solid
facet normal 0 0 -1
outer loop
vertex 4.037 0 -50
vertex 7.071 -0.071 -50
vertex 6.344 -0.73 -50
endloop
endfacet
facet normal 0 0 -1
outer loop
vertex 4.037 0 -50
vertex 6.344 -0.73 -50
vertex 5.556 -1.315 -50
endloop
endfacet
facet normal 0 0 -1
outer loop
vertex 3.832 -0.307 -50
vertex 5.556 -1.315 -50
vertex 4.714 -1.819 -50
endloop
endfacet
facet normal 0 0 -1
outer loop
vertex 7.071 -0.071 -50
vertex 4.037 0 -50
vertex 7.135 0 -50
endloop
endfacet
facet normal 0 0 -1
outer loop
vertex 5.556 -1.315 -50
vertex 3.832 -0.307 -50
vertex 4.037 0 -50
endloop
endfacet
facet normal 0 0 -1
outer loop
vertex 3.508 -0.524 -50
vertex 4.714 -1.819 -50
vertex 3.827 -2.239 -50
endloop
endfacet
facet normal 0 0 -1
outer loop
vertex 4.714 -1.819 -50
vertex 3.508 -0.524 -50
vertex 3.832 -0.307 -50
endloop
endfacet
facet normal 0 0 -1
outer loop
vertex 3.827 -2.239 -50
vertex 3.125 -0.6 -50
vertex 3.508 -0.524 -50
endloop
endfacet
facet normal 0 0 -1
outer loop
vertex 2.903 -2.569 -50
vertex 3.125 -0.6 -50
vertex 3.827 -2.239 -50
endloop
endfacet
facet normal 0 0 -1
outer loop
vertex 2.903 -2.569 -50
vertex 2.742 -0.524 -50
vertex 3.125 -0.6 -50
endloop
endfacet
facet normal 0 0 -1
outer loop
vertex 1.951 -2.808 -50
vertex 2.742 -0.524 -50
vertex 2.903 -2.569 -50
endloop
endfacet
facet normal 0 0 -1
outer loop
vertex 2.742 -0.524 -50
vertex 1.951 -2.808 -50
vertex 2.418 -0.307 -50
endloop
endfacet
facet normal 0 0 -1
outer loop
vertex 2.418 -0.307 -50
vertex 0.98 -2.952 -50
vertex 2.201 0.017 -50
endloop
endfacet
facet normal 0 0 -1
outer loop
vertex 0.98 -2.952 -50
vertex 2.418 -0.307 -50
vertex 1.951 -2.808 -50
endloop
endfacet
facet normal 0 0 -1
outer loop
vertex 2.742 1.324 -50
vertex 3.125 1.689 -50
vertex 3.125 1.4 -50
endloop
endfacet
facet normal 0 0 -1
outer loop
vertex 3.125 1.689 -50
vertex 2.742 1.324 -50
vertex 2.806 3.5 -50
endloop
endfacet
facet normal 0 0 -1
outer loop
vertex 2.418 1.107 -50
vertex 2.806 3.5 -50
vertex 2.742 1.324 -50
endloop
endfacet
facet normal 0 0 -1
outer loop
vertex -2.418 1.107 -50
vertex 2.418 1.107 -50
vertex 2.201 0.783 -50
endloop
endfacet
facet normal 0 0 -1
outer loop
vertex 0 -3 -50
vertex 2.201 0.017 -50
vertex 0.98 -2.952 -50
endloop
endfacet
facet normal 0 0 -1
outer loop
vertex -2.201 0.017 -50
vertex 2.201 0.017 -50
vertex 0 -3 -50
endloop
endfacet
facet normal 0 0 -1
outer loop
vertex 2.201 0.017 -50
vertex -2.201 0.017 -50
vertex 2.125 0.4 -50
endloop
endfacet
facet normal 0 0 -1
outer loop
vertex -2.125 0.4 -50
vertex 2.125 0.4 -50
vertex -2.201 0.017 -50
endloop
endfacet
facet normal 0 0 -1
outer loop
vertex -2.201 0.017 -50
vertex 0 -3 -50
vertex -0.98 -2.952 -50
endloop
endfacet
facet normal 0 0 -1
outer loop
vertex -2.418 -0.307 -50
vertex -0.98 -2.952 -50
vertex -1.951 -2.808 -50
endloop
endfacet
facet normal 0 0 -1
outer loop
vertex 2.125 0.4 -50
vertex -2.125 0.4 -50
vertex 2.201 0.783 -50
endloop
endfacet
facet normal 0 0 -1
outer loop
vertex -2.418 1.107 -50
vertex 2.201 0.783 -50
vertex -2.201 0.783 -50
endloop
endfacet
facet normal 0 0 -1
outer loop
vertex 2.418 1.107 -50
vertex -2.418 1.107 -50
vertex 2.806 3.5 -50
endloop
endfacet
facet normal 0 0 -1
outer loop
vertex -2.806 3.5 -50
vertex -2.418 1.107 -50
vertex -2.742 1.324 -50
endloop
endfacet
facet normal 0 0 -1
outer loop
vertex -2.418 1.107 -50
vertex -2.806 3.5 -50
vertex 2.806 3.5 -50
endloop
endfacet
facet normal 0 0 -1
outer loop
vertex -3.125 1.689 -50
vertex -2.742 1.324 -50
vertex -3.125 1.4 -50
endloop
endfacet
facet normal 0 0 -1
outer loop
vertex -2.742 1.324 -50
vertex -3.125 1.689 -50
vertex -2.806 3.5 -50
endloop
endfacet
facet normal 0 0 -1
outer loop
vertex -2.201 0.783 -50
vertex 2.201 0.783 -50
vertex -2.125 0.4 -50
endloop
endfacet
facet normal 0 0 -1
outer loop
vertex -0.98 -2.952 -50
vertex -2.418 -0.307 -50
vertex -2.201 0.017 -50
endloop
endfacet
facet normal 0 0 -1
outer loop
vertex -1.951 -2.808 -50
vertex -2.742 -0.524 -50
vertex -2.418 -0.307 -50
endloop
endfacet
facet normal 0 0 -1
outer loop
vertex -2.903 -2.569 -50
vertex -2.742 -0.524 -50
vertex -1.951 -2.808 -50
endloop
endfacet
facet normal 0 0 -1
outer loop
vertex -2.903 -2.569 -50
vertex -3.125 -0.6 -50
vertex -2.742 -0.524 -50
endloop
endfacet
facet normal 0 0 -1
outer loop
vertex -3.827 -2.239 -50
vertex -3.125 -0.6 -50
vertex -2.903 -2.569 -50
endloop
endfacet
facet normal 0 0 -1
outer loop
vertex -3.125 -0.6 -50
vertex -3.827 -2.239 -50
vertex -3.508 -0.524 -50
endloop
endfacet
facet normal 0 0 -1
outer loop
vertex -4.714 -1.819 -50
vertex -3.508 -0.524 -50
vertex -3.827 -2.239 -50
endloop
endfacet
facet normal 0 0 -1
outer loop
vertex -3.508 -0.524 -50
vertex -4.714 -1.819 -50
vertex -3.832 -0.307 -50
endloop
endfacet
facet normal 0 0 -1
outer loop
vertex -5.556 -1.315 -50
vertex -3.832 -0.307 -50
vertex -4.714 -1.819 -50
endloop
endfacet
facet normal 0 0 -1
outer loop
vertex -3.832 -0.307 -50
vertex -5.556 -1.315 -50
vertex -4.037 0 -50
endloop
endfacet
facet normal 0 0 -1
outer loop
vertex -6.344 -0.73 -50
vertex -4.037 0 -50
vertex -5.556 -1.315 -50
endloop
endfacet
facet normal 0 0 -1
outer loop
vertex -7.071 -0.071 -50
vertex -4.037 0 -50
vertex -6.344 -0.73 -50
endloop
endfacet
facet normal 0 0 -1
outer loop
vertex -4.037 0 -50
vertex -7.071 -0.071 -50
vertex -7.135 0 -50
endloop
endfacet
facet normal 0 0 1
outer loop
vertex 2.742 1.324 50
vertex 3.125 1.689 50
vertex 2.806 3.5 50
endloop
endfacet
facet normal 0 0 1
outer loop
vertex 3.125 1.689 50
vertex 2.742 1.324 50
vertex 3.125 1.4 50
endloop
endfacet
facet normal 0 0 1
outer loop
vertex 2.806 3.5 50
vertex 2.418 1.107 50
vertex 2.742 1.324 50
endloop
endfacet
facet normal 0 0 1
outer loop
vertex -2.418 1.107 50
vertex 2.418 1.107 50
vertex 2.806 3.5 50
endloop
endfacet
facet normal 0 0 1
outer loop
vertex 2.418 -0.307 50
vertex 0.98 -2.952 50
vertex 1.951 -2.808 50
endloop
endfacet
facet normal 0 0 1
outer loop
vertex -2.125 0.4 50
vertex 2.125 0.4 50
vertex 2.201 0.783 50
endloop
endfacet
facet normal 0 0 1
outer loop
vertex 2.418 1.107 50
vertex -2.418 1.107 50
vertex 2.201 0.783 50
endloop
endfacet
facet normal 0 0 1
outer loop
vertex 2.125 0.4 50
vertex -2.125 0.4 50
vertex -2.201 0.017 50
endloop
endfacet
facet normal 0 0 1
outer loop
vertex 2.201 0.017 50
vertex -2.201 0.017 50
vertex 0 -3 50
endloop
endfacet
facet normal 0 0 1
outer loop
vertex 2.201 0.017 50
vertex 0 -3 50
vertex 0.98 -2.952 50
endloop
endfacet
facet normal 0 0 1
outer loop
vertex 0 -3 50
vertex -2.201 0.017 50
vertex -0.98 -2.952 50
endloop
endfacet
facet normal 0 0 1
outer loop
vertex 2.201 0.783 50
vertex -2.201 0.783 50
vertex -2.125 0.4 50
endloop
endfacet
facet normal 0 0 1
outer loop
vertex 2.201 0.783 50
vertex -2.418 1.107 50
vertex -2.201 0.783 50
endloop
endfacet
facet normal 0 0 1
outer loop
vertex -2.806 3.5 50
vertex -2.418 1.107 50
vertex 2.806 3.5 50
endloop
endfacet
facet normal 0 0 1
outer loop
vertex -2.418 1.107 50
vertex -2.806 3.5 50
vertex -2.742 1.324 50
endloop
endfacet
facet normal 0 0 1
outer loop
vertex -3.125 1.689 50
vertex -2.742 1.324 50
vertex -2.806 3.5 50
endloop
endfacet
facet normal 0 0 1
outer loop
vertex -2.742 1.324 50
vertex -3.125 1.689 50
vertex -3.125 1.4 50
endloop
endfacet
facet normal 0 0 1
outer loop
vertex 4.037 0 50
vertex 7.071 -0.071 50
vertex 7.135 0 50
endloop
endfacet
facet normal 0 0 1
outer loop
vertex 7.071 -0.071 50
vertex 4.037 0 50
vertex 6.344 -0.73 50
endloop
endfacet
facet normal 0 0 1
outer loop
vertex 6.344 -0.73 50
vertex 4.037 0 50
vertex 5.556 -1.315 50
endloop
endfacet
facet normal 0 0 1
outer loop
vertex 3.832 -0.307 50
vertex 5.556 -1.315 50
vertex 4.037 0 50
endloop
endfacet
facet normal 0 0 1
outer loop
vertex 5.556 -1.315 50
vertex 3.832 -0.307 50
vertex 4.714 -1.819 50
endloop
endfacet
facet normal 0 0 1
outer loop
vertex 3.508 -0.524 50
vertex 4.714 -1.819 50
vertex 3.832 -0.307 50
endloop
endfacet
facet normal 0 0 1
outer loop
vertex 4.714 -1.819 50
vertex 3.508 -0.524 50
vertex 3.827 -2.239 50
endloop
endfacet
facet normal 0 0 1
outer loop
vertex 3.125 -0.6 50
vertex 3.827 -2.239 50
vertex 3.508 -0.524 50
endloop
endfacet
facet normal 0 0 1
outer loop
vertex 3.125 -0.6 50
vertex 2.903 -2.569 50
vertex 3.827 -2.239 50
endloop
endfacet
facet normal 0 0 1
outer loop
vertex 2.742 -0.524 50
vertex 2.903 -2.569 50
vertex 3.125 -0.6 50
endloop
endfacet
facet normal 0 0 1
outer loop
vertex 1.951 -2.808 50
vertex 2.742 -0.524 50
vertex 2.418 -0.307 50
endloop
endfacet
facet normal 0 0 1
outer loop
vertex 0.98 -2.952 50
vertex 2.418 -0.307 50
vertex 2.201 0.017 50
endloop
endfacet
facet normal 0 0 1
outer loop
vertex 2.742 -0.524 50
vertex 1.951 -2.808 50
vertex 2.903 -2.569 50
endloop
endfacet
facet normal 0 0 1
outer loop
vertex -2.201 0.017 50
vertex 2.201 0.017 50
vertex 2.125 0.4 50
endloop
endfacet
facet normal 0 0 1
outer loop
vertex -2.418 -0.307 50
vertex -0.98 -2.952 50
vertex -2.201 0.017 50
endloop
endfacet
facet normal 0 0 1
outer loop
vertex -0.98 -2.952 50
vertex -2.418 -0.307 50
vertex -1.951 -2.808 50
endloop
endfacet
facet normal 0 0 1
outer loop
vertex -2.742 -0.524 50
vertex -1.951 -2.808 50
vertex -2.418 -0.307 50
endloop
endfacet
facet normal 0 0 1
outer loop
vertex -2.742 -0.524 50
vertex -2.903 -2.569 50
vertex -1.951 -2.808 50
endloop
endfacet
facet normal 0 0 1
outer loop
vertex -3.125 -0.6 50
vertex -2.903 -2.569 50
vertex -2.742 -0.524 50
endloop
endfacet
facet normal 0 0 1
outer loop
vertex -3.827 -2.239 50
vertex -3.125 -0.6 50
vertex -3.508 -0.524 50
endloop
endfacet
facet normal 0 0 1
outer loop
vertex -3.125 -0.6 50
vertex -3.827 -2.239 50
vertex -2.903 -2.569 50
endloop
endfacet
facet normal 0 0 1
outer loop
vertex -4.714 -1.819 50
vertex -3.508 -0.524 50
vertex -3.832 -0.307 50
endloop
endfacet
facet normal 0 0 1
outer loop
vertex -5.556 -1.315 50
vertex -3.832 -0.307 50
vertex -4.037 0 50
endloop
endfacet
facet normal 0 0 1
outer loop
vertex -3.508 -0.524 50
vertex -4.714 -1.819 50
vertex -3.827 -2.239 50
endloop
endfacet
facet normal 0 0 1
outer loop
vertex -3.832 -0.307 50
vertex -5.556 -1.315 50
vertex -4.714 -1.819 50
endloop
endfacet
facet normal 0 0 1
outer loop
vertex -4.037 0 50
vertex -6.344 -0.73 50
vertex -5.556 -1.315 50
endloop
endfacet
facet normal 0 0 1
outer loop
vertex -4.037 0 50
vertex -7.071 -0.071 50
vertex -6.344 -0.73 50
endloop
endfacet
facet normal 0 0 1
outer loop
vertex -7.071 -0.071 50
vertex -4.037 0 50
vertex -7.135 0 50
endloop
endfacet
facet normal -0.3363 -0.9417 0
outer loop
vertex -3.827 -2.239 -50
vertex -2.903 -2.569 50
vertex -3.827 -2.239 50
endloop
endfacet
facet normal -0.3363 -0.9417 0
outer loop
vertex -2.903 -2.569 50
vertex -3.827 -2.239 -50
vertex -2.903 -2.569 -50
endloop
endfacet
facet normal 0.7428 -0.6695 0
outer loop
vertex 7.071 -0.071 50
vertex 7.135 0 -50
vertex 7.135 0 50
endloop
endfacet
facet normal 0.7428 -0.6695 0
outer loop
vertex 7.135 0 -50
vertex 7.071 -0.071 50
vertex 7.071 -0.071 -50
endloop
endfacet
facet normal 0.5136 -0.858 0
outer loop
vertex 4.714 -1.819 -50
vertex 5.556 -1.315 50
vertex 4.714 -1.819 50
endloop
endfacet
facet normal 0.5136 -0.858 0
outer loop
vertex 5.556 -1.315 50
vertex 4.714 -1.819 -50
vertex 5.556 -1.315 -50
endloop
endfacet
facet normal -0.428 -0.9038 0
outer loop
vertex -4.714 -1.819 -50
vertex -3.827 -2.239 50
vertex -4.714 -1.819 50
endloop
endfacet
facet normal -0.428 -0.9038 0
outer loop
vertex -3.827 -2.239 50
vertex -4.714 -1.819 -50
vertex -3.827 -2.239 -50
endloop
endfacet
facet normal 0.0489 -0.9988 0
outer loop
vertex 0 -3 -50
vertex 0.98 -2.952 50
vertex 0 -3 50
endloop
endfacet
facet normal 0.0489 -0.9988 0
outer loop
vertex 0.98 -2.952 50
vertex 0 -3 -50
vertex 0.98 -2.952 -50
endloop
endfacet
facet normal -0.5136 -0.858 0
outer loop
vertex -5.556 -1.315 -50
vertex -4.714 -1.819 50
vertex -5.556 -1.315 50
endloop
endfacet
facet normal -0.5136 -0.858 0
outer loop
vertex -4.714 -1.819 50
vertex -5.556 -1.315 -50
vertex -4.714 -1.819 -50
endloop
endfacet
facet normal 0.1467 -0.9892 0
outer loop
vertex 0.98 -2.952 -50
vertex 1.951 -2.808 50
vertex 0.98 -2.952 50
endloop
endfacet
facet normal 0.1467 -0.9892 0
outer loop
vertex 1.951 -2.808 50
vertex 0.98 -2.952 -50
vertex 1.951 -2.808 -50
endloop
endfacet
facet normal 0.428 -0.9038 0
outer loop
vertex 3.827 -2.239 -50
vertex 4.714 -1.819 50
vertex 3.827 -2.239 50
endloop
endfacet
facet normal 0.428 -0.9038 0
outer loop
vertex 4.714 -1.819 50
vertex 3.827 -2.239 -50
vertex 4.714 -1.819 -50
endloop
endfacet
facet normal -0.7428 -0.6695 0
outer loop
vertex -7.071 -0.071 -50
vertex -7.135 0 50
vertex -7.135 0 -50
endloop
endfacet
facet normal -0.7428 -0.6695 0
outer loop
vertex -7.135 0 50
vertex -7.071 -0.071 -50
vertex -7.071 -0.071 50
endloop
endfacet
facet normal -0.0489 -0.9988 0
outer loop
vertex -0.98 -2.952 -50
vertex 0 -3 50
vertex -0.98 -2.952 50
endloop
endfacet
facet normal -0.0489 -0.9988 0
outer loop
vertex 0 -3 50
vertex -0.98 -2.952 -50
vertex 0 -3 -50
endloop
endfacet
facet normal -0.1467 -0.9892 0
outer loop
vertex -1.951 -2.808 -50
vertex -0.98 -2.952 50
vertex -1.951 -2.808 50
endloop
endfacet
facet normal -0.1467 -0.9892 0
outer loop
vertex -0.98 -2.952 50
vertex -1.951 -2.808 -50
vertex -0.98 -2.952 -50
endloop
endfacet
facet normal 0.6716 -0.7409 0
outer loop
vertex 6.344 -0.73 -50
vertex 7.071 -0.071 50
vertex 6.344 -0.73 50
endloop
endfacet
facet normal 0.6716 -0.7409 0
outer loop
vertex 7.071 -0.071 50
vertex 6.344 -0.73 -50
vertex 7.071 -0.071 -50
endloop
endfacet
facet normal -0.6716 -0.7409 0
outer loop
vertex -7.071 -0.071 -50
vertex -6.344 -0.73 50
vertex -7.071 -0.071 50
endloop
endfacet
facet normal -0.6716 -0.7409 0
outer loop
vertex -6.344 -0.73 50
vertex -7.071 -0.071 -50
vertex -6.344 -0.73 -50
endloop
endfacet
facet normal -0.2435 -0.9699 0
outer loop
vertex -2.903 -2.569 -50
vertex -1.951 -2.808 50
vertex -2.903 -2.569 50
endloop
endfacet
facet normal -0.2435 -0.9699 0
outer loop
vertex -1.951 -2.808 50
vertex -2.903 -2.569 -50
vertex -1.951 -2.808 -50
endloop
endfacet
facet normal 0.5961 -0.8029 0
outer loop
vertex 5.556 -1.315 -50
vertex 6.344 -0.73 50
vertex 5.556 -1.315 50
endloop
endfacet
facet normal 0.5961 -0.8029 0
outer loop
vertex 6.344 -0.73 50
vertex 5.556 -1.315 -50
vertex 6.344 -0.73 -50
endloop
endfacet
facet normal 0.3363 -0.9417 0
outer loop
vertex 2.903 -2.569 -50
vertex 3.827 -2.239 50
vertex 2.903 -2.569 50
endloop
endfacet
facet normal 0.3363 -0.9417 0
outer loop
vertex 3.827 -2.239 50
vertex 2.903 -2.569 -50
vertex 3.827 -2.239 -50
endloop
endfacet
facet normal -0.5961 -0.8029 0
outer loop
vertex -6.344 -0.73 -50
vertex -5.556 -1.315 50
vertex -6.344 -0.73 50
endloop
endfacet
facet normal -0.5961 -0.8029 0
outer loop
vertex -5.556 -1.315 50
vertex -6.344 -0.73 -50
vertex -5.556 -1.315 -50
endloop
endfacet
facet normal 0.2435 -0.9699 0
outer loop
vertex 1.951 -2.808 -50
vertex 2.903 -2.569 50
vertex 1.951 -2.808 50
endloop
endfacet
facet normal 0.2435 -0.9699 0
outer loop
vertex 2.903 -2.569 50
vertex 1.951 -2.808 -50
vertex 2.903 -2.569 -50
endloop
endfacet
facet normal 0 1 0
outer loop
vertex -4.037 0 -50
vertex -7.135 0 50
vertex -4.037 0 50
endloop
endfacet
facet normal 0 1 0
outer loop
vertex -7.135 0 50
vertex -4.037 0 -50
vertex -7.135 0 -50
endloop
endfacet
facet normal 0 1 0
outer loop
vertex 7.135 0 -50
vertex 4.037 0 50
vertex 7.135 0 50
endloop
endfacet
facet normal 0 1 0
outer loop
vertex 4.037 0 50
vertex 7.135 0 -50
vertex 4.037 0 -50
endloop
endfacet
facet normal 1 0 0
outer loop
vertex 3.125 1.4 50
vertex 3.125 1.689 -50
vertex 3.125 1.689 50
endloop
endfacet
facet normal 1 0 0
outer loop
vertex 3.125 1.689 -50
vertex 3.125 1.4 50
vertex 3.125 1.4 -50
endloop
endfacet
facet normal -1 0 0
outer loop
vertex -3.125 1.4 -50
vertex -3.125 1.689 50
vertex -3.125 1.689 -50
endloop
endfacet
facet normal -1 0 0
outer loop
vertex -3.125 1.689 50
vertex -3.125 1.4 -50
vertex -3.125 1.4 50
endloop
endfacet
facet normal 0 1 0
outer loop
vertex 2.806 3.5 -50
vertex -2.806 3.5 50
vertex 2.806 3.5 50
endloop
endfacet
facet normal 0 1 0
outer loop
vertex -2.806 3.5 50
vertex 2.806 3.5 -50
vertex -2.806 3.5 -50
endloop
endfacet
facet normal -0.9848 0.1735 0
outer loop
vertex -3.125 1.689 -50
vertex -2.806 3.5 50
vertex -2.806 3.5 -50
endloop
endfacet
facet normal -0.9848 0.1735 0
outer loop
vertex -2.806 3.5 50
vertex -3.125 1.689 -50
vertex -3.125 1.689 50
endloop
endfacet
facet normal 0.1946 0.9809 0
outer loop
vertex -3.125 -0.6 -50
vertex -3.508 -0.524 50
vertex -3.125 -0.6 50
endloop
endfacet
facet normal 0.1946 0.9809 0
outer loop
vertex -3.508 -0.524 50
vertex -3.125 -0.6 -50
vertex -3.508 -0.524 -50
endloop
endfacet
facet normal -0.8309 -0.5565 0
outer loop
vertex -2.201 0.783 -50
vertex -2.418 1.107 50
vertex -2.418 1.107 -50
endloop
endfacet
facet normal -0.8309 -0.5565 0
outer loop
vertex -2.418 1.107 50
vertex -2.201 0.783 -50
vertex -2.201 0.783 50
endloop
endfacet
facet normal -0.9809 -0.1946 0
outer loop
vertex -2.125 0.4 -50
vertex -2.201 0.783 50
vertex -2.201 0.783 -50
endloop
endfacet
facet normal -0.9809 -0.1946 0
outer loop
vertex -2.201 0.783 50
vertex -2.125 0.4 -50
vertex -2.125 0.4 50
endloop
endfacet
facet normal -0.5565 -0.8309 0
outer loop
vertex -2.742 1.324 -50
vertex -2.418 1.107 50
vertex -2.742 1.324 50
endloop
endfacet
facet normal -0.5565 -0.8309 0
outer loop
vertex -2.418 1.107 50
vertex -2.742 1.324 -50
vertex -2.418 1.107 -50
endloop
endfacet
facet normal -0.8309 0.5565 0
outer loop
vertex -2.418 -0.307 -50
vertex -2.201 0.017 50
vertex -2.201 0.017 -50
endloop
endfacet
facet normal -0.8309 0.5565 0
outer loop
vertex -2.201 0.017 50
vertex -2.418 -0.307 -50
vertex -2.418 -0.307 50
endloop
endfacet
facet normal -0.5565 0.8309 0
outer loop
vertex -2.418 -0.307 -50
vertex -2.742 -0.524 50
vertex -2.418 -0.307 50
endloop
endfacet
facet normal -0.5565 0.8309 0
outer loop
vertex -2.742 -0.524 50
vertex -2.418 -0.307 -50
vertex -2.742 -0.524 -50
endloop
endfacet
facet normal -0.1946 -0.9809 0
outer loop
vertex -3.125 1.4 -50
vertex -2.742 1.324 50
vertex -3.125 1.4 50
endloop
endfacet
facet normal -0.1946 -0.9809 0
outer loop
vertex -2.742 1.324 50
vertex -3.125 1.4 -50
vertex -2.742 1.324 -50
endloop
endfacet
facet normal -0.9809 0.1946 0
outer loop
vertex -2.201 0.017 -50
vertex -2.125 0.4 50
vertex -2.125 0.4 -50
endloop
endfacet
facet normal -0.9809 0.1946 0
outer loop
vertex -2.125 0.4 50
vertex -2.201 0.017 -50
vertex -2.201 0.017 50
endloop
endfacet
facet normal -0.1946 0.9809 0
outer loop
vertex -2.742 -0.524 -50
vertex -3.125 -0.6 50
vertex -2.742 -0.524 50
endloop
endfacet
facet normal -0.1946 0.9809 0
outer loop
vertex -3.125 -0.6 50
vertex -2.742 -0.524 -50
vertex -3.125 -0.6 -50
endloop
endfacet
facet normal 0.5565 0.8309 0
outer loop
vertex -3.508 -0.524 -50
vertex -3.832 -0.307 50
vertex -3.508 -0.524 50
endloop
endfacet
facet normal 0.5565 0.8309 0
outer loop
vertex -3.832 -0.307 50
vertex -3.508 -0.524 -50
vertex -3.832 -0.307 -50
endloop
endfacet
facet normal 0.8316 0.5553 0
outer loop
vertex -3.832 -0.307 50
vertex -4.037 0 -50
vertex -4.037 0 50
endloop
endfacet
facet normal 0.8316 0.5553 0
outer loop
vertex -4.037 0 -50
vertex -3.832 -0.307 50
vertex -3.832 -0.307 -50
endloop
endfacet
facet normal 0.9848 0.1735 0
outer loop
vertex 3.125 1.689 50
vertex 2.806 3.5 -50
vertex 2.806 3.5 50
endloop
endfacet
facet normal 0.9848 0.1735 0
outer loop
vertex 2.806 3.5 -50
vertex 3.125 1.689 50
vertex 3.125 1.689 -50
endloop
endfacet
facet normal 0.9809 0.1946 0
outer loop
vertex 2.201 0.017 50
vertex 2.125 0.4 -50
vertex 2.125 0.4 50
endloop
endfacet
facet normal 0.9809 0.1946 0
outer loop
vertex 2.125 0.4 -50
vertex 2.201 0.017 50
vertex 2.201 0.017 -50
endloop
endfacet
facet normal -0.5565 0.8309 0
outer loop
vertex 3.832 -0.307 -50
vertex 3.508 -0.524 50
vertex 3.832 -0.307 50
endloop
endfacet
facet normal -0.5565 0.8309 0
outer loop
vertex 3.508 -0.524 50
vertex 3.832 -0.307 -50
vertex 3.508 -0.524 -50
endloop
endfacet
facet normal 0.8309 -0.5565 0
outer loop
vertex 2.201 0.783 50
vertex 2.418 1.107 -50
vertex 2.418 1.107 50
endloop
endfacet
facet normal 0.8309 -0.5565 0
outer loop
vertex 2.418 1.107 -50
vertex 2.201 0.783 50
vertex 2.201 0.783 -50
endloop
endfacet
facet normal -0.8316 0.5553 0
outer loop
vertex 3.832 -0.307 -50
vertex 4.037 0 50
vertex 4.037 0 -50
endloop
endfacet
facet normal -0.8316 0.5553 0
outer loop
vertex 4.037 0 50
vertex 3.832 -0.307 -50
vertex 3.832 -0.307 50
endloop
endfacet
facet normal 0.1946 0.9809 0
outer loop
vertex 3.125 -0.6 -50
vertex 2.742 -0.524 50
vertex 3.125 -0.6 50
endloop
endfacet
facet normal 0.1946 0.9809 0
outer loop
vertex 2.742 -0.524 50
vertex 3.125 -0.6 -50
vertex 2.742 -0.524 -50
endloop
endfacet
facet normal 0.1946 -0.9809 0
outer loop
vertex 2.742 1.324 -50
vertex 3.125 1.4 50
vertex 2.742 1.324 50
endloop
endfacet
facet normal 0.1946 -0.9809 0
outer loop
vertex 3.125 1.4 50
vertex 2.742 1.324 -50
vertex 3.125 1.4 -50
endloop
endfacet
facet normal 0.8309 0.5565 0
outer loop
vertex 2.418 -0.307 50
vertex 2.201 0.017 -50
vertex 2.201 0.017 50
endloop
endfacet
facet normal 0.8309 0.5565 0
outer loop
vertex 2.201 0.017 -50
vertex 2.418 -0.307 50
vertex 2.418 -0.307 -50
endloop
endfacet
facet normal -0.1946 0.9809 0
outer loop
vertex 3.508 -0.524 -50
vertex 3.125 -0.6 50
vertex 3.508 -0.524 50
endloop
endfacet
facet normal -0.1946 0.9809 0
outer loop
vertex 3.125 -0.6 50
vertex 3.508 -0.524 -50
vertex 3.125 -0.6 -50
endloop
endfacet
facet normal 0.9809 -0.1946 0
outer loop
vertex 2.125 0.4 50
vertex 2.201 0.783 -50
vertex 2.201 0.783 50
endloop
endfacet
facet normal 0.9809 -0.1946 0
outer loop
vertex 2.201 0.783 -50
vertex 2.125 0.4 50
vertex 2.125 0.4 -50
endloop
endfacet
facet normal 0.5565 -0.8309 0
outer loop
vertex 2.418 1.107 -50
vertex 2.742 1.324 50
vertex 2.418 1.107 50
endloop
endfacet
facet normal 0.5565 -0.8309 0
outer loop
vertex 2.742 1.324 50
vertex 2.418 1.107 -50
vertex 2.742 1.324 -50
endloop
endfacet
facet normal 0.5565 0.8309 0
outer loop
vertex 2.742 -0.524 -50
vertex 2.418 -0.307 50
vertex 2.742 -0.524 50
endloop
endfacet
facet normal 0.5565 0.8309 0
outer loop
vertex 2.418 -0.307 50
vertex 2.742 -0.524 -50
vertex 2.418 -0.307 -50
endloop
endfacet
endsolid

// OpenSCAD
//The height of the cover
height=100;




holeSize=6.25;


depth=3.5;

difference()
{
    union()
    {
        difference()
        {
            translate([0,7,0]) cylinder(r=10, h=height, center=true, $fn=64);
            translate([0,10,0]) cube([20,20,height+1], center=true);
        }
        translate([0,depth/2, 0]) cube([holeSize, 3.5, height], center=true);
    } 
    for (x=[-1,1])
    {
        translate([x*5.45,2.9,0]) rotate([0,0,x*10]) cube([5,5,height+1], center=true);
        translate([x*holeSize/2,0.4,0]) cylinder(r=1, h=height+1, center=true, $fn=16);
    }
}

